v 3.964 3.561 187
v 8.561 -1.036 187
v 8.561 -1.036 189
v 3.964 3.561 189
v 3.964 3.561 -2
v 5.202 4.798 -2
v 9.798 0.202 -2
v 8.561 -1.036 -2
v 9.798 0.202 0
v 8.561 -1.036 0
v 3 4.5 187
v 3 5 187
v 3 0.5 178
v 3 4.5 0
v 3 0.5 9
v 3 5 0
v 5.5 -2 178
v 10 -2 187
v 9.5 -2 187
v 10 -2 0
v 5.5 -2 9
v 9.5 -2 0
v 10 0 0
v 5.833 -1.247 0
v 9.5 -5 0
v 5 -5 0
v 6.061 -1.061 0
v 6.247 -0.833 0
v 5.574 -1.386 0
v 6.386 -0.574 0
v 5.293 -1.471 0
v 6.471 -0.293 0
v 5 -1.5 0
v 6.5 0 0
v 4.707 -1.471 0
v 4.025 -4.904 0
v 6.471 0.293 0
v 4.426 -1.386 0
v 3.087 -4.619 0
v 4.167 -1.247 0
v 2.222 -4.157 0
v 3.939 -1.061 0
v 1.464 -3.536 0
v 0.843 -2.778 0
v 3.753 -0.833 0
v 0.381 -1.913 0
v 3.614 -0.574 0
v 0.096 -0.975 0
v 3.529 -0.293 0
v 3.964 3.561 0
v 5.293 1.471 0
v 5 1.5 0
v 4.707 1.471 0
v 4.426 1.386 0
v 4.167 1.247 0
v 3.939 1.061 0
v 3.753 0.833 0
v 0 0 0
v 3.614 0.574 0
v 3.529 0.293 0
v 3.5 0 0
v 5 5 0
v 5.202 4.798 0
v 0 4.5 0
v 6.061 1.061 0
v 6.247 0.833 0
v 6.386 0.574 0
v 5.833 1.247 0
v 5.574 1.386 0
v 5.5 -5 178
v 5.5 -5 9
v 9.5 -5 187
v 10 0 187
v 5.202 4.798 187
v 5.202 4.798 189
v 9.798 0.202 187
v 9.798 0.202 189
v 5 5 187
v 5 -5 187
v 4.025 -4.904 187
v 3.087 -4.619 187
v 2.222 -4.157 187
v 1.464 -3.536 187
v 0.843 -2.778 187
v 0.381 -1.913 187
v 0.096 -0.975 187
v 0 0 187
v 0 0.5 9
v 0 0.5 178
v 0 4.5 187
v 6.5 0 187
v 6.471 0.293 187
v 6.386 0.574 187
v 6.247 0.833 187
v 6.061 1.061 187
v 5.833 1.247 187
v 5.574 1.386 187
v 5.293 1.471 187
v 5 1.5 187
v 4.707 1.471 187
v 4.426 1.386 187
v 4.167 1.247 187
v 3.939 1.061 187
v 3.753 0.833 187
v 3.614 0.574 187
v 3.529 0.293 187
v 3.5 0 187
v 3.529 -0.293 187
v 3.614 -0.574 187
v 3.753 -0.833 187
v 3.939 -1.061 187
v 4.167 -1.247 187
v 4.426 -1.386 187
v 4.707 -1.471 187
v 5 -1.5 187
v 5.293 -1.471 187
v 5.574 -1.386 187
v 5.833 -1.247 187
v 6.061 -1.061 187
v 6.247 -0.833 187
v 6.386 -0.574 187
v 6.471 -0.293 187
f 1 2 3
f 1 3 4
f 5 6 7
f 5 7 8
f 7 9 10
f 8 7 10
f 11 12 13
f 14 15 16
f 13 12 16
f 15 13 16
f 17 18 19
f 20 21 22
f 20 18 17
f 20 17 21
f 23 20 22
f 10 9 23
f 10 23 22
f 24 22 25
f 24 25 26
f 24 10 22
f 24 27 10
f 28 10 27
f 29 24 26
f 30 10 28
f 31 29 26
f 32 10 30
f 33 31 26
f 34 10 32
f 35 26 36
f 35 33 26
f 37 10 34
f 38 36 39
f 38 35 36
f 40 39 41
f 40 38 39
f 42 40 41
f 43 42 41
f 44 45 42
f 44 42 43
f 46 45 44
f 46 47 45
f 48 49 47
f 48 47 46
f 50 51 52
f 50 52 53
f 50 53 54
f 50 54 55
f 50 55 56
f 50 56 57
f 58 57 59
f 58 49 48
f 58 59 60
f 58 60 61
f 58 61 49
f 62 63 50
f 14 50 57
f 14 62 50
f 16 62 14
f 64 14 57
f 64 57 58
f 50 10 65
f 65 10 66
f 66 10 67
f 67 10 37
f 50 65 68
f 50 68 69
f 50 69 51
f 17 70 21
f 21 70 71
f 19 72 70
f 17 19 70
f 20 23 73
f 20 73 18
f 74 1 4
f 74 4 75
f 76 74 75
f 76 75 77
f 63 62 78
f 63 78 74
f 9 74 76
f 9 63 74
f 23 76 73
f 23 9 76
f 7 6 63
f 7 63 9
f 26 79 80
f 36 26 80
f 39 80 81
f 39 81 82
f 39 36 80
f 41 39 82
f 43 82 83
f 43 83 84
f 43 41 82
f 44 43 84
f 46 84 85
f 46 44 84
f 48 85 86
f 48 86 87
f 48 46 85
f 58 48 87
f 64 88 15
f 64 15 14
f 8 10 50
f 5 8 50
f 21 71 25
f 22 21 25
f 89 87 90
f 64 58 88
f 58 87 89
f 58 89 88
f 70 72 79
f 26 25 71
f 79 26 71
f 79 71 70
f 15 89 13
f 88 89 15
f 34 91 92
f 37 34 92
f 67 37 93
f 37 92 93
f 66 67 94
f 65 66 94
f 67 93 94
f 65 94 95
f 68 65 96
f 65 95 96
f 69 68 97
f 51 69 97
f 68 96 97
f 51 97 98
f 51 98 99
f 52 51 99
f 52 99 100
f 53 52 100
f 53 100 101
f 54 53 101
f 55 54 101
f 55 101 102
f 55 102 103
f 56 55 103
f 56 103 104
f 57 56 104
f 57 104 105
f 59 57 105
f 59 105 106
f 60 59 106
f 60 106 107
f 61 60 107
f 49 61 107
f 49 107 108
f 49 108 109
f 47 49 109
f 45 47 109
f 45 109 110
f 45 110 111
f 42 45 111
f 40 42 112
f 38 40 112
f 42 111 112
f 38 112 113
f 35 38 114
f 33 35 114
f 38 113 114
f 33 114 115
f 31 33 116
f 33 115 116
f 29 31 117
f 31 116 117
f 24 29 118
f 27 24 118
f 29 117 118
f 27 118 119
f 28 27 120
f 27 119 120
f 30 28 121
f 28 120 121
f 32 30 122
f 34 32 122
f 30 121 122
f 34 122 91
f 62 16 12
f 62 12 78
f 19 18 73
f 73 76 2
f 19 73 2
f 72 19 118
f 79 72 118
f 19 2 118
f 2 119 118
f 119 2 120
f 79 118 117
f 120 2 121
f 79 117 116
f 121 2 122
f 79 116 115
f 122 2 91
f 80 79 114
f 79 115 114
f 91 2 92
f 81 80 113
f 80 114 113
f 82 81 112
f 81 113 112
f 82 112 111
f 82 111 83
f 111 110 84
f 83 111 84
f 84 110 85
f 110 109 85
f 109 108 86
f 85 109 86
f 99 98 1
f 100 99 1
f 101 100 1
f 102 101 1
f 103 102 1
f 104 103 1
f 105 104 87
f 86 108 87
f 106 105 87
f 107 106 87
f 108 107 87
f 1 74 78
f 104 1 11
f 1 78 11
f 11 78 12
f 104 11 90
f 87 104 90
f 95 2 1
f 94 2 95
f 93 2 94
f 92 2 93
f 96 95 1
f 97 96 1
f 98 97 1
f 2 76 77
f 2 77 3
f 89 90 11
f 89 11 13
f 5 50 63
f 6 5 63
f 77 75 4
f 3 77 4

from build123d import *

# Parameters (mm, degrees)
BOSS_EXTRUDE1_DEPTH      = 187
SKETCH3_R                = 1.5
CUT_EXTRUDE2_DEPTH       = 188
CUT_EXTRUDE1_DEPTH       = 3
BOSS_EXTRUDE2_DEPTH      = 2
BOSS_EXTRUDE2_DEPTH_BACK = 189


with BuildPart() as part:
    # Sketch1 → Boss-Extrude1 (new body)
    with BuildSketch(Plane.XY):
        with BuildLine():
            Line((0, 0), (0, 5))
            Line((0, 5), (5, 5))
            Line((5, 5), (10, 0))
            Line((10, 0), (10, -5))
            Line((10, -5), (5, -5))
            ThreePointArc((5, -5), (1.464466094, -3.535533906), (0, 0))
        make_face()
    extrude(amount=BOSS_EXTRUDE1_DEPTH)

    # Sketch3 → Cut-Extrude2 (cut, through all)
    with BuildSketch(Plane.XY.offset(187)):
        with Locations((5, 0)):
            Circle(SKETCH3_R)
    extrude(amount=-CUT_EXTRUDE2_DEPTH, mode=Mode.SUBTRACT)

    # Sketch2 → Cut-Extrude1 (cut)
    with BuildSketch(Plane.ZY):
        Polygon((178, 0.5), (9, 0.5), (0, 4.5), (0, 5), (187, 5), (187, 4.5), align=None)
    cut_extrude1 = extrude(amount=-CUT_EXTRUDE1_DEPTH, mode=Mode.SUBTRACT)

    # Mirror1: Cut-Extrude1 across plane
    add(cut_extrude1.mirror(Plane(origin=(2.5, -2.5, 0), x_dir=(0, 0, 1), z_dir=(-0.707106781, 0.707106781, 0))), mode=Mode.SUBTRACT)

    # Sketch4 → Boss-Extrude2 (add, two sides)
    with BuildSketch(Plane.XY.offset(187)) as boss_extrude2_sk:
        Polygon((5.201902961, 4.798097039), (9.798097039, 0.201902961), (8.560660172, -1.035533906), (3.964466094, 3.560660172), align=None)
    extrude(amount=BOSS_EXTRUDE2_DEPTH)
    extrude(boss_extrude2_sk.sketch, amount=-BOSS_EXTRUDE2_DEPTH_BACK)


solid = part.part
